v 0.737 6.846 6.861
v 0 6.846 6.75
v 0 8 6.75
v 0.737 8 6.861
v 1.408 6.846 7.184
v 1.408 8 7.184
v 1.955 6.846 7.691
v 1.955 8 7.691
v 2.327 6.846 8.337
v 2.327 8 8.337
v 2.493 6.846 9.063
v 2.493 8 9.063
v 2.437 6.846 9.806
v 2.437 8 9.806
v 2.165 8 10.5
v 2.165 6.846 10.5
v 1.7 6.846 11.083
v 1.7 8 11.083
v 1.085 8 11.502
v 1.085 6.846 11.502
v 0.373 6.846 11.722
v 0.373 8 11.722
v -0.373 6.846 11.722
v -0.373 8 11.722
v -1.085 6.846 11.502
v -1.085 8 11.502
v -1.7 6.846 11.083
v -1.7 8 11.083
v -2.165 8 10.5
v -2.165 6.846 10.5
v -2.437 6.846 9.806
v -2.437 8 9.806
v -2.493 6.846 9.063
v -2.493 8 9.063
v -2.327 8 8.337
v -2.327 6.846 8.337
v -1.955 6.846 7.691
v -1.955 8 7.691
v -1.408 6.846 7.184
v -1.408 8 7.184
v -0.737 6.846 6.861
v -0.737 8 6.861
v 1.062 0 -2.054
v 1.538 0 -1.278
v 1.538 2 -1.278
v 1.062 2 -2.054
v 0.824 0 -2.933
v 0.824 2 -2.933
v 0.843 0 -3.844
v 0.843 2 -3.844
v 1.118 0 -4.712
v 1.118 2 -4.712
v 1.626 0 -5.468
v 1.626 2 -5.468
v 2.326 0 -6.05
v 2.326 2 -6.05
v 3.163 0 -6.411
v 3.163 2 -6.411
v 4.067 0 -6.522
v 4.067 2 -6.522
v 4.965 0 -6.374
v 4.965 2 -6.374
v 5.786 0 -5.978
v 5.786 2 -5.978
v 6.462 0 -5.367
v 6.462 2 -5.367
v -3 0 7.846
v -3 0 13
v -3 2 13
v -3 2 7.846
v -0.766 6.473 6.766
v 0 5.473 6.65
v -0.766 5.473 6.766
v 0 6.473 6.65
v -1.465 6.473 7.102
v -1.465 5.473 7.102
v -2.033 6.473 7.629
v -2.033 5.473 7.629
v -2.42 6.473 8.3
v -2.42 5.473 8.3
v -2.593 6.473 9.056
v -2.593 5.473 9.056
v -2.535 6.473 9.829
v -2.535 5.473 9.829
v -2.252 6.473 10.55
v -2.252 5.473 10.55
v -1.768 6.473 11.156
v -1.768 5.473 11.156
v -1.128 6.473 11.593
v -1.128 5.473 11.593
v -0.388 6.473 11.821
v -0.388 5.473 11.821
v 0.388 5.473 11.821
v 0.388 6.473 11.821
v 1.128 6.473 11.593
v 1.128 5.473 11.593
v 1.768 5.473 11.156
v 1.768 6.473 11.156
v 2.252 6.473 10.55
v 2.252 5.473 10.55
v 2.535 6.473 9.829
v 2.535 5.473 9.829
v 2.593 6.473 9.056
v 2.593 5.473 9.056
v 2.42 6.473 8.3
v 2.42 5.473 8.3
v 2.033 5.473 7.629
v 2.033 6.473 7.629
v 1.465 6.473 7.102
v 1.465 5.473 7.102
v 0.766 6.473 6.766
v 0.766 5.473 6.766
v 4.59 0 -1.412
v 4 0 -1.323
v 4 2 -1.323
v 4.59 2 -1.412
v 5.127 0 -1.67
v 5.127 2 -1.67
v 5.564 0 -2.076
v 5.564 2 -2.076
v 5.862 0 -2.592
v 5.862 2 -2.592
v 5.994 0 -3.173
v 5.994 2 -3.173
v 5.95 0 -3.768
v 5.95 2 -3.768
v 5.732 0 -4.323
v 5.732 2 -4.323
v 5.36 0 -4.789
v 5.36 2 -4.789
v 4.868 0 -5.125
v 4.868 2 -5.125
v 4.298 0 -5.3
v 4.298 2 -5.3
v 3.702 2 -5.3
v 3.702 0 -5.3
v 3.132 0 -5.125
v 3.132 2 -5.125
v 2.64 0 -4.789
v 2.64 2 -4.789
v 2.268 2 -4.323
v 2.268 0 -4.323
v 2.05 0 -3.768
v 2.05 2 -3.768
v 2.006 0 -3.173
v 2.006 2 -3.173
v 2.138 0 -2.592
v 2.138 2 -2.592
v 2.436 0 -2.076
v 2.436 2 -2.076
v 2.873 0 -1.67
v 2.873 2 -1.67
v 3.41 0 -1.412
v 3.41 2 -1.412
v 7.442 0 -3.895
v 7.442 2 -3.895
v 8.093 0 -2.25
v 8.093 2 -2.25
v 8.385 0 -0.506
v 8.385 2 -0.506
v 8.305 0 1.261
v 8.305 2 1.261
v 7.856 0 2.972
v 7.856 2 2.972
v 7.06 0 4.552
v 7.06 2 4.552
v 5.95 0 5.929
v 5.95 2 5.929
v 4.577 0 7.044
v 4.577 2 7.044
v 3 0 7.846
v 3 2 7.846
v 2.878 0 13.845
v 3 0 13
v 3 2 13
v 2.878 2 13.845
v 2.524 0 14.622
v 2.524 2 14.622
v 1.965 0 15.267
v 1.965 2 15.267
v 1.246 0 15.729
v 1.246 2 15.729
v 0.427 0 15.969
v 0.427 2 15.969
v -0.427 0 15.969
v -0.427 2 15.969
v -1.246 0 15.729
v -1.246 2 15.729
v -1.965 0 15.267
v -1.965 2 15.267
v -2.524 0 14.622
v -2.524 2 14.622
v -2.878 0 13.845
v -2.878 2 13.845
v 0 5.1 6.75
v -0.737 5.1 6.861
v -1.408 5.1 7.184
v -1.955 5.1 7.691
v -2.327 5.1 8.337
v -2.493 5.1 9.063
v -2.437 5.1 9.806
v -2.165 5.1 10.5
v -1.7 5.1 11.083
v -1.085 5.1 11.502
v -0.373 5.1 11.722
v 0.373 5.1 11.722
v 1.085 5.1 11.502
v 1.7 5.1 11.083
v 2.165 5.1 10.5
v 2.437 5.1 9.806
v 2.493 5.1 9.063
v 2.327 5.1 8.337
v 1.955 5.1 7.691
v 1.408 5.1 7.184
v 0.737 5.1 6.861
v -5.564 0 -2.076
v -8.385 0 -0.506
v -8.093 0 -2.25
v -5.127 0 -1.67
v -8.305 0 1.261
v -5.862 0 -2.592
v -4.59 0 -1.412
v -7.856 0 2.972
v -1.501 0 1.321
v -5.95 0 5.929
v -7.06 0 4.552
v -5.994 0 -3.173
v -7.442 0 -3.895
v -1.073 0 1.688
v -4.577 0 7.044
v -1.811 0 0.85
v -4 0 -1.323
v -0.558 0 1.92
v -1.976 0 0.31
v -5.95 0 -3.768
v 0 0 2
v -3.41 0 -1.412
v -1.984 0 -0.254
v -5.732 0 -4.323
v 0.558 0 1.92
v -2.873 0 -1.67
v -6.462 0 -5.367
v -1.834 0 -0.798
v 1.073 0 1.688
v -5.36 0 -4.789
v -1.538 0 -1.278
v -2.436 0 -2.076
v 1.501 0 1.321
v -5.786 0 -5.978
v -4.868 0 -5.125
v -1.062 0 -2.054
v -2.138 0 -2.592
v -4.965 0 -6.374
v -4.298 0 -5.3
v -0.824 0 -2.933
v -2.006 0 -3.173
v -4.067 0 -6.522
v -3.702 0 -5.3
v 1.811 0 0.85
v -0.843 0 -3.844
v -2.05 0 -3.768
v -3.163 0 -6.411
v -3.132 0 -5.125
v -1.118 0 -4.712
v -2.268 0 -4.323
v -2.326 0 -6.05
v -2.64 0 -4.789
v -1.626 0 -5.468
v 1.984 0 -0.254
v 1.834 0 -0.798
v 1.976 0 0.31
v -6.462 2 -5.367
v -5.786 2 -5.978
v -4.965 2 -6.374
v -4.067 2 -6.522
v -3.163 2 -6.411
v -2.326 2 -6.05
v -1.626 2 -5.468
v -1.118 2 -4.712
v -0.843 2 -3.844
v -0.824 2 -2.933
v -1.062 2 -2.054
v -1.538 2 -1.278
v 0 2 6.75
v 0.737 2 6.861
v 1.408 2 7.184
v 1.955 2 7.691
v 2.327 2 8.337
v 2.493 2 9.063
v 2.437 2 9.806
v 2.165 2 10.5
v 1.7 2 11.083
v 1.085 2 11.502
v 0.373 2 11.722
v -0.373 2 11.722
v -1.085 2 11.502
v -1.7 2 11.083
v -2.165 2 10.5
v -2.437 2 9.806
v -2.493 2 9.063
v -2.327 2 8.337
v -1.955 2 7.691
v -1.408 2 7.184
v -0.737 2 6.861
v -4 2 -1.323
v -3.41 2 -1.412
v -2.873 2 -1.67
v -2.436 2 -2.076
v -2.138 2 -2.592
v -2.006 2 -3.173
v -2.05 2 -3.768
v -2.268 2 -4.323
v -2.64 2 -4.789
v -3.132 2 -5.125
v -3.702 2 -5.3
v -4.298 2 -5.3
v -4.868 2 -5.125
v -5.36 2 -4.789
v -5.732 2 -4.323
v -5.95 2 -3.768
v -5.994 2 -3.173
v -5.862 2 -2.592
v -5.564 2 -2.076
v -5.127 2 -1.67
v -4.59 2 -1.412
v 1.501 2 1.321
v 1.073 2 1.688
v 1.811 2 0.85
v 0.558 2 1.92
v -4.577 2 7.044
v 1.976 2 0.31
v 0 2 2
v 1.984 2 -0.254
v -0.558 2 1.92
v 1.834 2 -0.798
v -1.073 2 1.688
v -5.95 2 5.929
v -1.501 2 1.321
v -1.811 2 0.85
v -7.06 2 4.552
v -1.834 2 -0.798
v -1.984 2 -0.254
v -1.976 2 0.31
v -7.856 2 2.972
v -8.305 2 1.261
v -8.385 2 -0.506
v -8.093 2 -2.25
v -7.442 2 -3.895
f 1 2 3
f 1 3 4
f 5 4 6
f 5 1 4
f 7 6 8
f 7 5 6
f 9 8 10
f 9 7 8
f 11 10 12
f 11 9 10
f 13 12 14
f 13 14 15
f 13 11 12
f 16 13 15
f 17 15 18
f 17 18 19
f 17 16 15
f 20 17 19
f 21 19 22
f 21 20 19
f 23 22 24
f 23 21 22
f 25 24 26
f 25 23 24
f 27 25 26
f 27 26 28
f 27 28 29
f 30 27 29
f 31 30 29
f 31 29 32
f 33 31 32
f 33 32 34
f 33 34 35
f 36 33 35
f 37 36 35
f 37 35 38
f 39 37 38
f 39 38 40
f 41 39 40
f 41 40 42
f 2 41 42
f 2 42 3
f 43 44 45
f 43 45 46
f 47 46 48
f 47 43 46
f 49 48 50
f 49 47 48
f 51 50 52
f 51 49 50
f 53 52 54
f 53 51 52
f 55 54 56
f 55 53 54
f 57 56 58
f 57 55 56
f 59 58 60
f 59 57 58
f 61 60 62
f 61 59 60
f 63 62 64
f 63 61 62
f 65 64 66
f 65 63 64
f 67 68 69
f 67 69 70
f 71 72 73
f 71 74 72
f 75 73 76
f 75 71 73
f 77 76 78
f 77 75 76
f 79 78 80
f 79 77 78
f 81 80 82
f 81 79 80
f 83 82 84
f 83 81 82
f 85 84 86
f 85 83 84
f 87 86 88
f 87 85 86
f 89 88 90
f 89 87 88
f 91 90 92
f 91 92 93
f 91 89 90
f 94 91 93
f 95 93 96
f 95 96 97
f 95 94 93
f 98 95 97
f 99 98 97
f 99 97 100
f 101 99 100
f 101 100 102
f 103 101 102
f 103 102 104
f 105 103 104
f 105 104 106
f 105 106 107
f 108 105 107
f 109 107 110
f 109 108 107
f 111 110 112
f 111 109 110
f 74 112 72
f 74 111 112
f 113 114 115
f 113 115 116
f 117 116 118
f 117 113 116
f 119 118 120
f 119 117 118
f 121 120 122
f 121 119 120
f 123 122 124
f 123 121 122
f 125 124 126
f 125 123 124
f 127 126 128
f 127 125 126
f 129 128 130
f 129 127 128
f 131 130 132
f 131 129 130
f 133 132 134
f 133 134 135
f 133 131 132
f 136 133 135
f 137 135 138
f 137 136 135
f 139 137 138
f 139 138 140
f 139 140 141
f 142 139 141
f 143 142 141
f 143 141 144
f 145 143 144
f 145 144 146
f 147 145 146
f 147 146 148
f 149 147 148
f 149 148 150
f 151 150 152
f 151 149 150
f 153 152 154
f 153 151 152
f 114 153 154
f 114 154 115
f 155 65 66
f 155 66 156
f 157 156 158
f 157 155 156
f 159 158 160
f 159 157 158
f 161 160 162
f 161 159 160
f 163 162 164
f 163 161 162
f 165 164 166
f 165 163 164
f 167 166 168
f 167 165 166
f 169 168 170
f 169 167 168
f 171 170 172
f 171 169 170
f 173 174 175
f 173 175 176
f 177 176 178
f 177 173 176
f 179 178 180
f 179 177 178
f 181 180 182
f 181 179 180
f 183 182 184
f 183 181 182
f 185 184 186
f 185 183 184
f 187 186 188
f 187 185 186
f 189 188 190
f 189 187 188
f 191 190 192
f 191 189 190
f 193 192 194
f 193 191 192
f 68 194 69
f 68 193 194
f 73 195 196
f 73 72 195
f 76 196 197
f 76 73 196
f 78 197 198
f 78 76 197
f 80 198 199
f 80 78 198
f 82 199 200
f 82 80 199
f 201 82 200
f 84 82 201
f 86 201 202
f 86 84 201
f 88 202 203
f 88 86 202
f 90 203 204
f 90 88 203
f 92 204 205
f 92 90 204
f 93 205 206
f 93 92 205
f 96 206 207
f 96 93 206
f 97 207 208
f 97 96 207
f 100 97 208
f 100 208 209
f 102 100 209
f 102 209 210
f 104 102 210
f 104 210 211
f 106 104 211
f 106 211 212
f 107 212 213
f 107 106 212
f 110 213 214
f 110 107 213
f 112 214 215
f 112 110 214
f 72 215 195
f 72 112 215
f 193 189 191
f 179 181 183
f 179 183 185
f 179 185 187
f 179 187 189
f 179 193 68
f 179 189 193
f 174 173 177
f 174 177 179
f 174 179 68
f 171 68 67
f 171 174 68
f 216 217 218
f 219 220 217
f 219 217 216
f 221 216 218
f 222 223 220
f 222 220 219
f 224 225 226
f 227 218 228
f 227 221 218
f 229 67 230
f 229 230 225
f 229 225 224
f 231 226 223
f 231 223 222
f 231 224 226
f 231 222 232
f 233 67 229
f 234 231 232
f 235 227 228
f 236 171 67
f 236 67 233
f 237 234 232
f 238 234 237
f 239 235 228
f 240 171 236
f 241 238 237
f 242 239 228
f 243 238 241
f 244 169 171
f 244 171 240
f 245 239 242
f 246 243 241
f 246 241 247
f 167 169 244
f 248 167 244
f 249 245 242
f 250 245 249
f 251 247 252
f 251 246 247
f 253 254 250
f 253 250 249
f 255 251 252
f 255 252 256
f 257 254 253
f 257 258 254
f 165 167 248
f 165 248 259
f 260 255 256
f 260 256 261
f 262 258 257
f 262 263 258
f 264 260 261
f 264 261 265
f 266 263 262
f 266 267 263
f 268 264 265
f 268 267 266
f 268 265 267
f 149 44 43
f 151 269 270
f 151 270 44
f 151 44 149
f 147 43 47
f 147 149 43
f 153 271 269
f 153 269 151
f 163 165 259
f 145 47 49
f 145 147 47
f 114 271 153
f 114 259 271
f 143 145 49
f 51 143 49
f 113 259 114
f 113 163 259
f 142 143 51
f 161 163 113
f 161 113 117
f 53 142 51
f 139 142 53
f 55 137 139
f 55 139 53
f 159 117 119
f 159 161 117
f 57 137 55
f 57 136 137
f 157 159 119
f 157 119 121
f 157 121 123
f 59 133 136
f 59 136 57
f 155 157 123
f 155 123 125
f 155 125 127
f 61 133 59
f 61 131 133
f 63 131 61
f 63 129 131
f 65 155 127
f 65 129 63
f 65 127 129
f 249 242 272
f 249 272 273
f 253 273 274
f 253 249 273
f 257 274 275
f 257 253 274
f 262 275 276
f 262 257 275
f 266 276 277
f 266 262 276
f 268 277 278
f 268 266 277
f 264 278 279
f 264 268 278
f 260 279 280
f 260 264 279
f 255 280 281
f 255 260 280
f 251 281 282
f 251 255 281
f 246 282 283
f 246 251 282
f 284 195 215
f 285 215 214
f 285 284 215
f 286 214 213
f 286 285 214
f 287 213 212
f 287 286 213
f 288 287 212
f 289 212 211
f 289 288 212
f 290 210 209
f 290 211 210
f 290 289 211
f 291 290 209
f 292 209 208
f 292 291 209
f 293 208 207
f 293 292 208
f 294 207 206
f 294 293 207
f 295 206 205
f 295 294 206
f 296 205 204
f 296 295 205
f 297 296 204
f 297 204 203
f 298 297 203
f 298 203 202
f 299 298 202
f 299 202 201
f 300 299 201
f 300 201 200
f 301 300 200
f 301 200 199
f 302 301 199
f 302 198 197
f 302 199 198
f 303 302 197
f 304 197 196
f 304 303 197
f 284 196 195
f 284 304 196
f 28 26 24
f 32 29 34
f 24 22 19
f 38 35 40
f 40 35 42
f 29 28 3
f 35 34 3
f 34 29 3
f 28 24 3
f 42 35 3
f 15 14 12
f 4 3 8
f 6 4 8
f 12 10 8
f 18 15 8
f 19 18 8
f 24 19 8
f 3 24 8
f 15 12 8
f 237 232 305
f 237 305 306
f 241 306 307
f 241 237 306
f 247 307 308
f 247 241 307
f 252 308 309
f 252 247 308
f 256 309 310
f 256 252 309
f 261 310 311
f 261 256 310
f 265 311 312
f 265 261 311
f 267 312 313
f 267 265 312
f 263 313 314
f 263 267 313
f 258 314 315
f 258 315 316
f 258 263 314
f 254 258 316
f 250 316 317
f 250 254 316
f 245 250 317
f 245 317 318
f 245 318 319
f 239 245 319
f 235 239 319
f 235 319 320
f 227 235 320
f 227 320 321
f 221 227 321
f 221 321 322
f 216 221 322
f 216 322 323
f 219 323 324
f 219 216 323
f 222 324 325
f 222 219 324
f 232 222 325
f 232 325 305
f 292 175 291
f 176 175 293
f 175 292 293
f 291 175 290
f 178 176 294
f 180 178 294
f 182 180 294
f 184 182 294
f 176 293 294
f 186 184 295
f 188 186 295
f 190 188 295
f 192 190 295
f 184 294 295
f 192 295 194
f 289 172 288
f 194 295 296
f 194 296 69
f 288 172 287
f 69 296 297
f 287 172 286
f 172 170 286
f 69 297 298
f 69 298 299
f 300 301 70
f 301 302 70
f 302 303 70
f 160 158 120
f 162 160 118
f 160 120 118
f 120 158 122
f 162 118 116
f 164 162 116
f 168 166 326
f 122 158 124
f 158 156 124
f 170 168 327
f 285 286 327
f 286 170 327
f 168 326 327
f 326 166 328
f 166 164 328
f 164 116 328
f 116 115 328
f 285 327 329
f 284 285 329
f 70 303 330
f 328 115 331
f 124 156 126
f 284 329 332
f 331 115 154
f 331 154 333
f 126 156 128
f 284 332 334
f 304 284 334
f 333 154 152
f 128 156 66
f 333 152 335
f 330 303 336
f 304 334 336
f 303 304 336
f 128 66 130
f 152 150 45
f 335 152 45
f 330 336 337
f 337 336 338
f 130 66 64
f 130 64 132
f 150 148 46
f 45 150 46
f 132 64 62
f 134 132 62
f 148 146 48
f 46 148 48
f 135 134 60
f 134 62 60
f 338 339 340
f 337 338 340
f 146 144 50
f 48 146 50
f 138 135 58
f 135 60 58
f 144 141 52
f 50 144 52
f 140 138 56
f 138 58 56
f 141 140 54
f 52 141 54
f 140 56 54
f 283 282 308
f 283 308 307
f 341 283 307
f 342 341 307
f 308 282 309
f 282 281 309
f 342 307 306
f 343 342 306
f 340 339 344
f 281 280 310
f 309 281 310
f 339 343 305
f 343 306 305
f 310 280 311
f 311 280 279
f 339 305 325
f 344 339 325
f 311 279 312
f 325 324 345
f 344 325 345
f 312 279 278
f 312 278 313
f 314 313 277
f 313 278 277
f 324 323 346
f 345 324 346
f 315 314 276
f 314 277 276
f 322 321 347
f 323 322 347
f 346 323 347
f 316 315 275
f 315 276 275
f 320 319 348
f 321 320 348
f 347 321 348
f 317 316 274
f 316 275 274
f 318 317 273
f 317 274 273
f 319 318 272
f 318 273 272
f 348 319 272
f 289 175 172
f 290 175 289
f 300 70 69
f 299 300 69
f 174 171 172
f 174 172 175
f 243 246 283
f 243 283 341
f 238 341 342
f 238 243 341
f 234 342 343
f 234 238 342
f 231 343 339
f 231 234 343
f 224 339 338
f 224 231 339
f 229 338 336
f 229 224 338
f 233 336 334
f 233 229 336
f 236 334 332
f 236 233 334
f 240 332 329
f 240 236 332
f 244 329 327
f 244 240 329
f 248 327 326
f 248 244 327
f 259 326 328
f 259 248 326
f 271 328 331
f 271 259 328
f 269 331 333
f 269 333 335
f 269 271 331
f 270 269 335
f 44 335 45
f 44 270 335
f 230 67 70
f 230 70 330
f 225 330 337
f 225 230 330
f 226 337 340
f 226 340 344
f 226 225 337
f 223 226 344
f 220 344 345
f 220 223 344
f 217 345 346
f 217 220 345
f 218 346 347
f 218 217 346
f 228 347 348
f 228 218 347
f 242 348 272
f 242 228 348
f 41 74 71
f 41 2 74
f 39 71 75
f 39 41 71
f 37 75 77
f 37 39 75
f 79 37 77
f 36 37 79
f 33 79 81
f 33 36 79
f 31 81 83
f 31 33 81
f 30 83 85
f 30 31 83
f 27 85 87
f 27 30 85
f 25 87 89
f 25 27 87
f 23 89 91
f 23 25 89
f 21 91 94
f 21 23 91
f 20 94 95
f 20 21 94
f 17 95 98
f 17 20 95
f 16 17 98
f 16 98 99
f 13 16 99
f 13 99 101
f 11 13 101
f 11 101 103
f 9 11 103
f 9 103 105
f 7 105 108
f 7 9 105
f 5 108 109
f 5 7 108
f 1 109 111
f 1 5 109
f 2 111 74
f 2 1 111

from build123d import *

# Parameters (mm, degrees)
SKETCH_1_R      = 2
EXTRUDE_1_DEPTH = 2
SKETCH_2_R      = 2.5
EXTRUDE_2_DEPTH = 8


with BuildPart() as part:
    # 草图1 → 凸台-拉伸1 (new body)
    with BuildSketch(Plane(origin=(0, 0, 0), x_dir=(1, 0, 0), z_dir=(0, 1, 0))):
        with BuildLine():
            Line((3, -7.846018098), (3, -13))
            ThreePointArc((3, -13), (0, -16), (-3, -13))
            Line((-3, -13), (-3, -7.846018098))
            ThreePointArc((-3, -7.846018098), (-8.125792122, -2.128732579), (-6.461538462, 5.367356958))
            ThreePointArc((-6.461538462, 5.367356958), (-1.955292588, 5.784188007), (-1.538461538, 1.277942133))
            ThreePointArc((-1.538461538, 1.277942133), (0, -2), (1.538461538, 1.277942133))
            ThreePointArc((1.538461538, 1.277942133), (1.955292588, 5.784188007), (6.461538462, 5.367356958))
            ThreePointArc((6.461538462, 5.367356958), (8.125792122, -2.128732579), (3, -7.846018098))
        make_face()
        with Locations(Location((-4, 3.322649545, 0), (0, 0, 270))):
            Circle(SKETCH_1_R, mode=Mode.SUBTRACT)
        with Locations(Location((4, 3.322649545, 0), (0, 0, 270))):
            Circle(SKETCH_1_R, mode=Mode.SUBTRACT)
    extrude(amount=EXTRUDE_1_DEPTH)

    # 草图2 → 凸台-拉伸2 (add)
    with BuildSketch(Plane.XZ):
        with Locations(Location((0, 9.25, 0), (0, 0, 270))):
            Circle(SKETCH_2_R)
    extrude(amount=-EXTRUDE_2_DEPTH)

    # 草图7 → 旋转3 (revolve)
    with BuildSketch(Plane(origin=(0, 0, 11.498467043), x_dir=(0, 0, 1), z_dir=(-1, 0, 0)), mode=Mode.PRIVATE) as revolve_3_sk:
        Polygon((-2.248467043, 5.1), (0.251532957, 5.1), (0.351532957, 5.473205081), (0.351532957, 6.473205081), (0.251532957, 6.846410162), (-2.248467043, 6.846410162), align=None)
    revolve(revolve_3_sk.sketch.rotate(Axis((0, 2, 9.25), (0, 1, 0)), 180), axis=Axis((0, 2, 9.25), (0, 1, 0)))


solid = part.part
